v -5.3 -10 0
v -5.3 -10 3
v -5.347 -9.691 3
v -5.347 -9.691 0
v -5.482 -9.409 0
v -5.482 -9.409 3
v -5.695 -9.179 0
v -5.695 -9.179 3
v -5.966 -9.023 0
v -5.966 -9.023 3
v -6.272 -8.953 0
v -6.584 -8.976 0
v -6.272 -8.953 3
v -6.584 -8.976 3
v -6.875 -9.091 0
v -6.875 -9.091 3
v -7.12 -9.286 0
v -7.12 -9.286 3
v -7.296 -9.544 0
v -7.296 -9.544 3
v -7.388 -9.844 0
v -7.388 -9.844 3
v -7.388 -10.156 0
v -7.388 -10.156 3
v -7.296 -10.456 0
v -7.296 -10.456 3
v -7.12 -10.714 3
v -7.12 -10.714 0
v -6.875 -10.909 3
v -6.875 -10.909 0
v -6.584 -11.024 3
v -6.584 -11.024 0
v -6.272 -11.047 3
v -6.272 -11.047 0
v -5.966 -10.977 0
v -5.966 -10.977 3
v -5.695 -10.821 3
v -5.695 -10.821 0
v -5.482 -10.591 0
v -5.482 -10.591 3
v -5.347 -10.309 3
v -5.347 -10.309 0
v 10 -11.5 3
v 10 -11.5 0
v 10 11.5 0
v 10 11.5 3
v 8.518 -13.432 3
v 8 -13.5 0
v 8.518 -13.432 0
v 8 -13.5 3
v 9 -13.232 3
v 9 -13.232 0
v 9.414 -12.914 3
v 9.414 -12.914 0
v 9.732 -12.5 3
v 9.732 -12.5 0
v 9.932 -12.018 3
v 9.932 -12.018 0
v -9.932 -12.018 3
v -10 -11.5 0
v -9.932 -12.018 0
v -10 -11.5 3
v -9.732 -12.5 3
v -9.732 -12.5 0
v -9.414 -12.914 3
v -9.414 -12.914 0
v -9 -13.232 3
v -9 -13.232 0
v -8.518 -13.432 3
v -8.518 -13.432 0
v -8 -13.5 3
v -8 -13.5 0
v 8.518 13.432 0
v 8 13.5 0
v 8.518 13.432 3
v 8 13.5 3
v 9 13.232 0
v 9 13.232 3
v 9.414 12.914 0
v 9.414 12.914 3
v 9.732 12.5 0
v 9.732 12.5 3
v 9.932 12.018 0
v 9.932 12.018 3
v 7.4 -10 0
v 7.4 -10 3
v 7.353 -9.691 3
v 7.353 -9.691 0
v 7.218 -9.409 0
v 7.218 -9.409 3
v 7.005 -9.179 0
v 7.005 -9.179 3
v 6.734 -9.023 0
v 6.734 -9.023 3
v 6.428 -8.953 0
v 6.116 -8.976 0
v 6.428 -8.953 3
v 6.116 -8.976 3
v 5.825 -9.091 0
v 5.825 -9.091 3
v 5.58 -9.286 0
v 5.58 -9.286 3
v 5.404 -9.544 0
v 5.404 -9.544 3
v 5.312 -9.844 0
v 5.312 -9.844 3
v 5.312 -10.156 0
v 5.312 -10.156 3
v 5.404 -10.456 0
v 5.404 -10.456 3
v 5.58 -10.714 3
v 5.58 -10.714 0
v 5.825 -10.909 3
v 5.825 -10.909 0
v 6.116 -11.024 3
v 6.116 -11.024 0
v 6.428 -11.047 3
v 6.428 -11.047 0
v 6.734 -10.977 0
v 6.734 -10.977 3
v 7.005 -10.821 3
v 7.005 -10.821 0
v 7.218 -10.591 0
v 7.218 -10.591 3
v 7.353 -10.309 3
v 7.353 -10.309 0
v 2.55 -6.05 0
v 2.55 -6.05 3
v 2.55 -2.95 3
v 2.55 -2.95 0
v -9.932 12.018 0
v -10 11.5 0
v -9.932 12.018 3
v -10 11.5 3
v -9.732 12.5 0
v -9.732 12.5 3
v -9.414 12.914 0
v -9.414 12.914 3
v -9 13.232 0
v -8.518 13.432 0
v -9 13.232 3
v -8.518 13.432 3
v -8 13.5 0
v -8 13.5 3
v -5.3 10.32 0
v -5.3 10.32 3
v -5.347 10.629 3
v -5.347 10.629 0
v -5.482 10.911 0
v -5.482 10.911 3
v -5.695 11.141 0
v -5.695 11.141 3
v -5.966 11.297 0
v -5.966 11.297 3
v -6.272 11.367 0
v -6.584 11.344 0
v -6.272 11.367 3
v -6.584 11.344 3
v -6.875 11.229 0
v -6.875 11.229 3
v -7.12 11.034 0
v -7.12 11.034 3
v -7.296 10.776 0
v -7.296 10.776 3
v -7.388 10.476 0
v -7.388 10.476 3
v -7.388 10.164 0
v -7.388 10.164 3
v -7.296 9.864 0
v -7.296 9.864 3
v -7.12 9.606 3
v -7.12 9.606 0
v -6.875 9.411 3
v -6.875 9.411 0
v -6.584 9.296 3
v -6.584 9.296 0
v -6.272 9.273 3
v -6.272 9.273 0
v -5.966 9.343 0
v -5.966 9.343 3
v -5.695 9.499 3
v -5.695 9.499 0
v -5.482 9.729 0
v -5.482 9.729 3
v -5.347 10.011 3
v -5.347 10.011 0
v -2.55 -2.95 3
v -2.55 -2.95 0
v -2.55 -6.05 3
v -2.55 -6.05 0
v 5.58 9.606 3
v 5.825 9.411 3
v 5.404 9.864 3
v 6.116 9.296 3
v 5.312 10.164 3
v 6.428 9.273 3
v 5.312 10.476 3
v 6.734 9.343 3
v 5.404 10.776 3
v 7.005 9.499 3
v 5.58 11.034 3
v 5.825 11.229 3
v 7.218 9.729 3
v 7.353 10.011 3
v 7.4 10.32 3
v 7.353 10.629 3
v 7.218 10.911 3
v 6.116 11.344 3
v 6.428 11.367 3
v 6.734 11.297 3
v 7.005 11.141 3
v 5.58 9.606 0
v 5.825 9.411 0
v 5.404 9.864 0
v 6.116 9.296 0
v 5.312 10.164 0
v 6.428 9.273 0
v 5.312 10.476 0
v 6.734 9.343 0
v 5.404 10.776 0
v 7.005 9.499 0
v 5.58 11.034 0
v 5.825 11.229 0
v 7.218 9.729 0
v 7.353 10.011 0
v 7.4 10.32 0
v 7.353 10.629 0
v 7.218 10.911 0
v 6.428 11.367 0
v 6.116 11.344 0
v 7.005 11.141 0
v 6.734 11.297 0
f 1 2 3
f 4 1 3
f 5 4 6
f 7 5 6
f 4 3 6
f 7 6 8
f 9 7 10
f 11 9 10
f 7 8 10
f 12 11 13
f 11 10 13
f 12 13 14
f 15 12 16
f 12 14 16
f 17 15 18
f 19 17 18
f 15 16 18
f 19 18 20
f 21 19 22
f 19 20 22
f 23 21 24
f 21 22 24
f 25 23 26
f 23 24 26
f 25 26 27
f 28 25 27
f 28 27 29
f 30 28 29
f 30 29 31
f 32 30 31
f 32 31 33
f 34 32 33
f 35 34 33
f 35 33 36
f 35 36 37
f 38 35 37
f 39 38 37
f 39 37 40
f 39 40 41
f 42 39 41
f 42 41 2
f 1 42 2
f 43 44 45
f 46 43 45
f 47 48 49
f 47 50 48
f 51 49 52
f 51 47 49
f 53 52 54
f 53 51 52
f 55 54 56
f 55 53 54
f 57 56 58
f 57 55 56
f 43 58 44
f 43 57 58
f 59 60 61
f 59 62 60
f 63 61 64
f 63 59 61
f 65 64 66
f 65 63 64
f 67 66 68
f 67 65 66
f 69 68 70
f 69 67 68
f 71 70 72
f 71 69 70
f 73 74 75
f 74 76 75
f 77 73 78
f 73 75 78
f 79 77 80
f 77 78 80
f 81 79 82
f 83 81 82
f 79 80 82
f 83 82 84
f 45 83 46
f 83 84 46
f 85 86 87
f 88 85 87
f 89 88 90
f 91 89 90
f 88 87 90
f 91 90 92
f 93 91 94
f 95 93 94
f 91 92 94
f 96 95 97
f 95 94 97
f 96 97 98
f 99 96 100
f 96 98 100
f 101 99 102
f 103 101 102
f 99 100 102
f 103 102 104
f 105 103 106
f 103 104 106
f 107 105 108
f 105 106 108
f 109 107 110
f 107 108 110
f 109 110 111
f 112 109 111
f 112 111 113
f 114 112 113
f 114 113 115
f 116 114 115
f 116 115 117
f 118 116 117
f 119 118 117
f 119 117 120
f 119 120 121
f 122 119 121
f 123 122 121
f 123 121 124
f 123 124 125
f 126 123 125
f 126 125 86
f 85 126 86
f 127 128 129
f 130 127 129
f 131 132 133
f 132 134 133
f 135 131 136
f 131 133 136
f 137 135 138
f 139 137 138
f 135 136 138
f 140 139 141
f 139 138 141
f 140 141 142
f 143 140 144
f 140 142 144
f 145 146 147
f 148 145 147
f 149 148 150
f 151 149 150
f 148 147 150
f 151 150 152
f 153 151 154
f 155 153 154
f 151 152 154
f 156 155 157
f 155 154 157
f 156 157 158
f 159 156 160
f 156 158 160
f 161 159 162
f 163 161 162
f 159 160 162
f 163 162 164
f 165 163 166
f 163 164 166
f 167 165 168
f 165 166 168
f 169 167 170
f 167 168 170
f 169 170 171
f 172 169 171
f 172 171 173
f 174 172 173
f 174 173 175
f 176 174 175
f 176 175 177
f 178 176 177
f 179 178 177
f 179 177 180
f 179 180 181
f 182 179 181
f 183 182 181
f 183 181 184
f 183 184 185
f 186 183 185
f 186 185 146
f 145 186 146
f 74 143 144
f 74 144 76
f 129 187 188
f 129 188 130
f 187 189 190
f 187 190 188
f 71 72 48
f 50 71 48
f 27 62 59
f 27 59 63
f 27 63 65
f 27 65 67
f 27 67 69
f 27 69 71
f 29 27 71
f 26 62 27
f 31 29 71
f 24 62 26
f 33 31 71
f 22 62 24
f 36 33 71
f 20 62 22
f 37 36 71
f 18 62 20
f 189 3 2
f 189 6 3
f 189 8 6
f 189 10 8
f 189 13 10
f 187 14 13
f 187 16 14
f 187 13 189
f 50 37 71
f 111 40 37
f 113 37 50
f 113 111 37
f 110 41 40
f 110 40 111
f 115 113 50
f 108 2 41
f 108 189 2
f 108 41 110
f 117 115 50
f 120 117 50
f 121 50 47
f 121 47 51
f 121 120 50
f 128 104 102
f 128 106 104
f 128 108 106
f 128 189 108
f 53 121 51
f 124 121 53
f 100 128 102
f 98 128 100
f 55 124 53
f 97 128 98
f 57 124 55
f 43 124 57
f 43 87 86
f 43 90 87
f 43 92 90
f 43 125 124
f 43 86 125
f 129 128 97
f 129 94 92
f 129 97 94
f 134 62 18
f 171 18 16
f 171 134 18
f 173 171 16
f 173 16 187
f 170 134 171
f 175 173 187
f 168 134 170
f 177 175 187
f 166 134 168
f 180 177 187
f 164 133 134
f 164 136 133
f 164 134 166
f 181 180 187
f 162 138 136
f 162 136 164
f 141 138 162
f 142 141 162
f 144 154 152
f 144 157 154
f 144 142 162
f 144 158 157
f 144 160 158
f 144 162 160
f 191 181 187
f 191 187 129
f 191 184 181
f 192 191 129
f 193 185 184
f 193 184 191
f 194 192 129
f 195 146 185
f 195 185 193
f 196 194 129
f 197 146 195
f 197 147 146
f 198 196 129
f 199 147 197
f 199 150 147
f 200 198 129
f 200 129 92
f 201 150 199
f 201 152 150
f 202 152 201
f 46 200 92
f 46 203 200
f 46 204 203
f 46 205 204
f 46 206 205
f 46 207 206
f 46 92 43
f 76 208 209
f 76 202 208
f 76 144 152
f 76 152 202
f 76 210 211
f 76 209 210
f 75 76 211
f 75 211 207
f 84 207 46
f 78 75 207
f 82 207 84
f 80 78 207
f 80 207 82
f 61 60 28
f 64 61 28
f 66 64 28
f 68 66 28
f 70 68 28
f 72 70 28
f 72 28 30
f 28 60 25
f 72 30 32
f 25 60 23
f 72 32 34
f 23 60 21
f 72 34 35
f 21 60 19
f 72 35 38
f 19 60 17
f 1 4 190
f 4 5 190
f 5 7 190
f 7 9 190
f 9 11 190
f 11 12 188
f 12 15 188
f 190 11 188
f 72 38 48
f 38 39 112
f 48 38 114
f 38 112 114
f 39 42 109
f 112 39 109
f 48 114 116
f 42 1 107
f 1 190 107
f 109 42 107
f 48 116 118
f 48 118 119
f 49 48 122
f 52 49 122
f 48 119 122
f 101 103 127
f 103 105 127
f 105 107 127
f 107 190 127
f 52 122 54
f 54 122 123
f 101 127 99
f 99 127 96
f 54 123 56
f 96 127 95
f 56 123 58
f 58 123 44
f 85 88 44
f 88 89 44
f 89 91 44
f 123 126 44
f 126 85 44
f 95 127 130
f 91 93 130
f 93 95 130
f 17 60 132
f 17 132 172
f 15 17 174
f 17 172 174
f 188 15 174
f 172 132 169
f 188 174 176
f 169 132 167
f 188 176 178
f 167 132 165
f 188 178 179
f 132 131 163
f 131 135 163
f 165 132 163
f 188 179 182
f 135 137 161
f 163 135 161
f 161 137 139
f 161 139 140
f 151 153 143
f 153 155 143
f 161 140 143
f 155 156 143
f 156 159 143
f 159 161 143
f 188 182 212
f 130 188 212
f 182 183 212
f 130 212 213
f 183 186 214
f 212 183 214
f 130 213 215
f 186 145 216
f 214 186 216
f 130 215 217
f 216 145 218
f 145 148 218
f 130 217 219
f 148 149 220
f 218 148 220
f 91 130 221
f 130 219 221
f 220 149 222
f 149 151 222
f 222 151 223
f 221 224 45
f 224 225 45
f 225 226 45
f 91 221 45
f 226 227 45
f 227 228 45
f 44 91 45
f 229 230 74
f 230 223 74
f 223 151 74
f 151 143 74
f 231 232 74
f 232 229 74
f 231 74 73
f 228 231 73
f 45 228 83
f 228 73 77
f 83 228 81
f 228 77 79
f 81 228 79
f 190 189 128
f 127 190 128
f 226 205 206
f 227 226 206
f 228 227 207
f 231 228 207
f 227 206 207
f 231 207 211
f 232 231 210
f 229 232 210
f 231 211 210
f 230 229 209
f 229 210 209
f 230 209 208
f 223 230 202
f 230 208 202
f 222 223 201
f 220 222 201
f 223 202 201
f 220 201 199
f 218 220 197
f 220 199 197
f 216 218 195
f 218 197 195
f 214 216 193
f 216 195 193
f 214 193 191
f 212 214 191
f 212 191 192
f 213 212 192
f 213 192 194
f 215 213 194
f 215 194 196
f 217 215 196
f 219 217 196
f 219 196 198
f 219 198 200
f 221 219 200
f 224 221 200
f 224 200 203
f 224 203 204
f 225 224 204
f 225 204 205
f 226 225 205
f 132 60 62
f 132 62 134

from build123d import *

# Parameters (mm, degrees)
CROQUIS1_W              = 20
CROQUIS1_H              = 27
SALIENTE_EXTRUIR1_DEPTH = 3
CROQUIS2_W              = 5.1
CROQUIS2_H              = 3.1
CORTAR_EXTRUIR1_DEPTH   = 10
CROQUIS3_R              = 1.05
CORTAR_EXTRUIR2_DEPTH   = 10
REDONDEO1_R             = 2


with BuildPart() as part:
    # Croquis1 → Saliente-Extruir1 (new body)
    with BuildSketch(Plane.XY):
        Rectangle(CROQUIS1_W, CROQUIS1_H)
    extrude(amount=SALIENTE_EXTRUIR1_DEPTH)

    # Croquis2 → Cortar-Extruir1 (cut)
    with BuildSketch(Plane.XY.offset(3)):
        with Locations((0, -4.5)):
            Rectangle(CROQUIS2_W, CROQUIS2_H)
    extrude(amount=-CORTAR_EXTRUIR1_DEPTH, mode=Mode.SUBTRACT)

    # Croquis3 → Cortar-Extruir2 (cut)
    with BuildSketch(Plane.XY.offset(3)):
        with Locations((-6.35, 10.32)):
            Circle(CROQUIS3_R)
        with Locations((6.35, 10.32)):
            Circle(CROQUIS3_R)
        with Locations((6.35, -10)):
            Circle(CROQUIS3_R)
        with Locations((-6.35, -10)):
            Circle(CROQUIS3_R)
    extrude(amount=-CORTAR_EXTRUIR2_DEPTH, mode=Mode.SUBTRACT)

    # Redondeo1
    redondeo1_edges = [part.edges().sort_by_distance(p)[0] for p in [
        (10, -13.5, 1.5),
        (-10, -13.5, 1.5),
        (-10, 13.5, 1.5),
        (10, 13.5, 1.5),
    ]]
    fillet(redondeo1_edges, radius=REDONDEO1_R)


solid = part.part
